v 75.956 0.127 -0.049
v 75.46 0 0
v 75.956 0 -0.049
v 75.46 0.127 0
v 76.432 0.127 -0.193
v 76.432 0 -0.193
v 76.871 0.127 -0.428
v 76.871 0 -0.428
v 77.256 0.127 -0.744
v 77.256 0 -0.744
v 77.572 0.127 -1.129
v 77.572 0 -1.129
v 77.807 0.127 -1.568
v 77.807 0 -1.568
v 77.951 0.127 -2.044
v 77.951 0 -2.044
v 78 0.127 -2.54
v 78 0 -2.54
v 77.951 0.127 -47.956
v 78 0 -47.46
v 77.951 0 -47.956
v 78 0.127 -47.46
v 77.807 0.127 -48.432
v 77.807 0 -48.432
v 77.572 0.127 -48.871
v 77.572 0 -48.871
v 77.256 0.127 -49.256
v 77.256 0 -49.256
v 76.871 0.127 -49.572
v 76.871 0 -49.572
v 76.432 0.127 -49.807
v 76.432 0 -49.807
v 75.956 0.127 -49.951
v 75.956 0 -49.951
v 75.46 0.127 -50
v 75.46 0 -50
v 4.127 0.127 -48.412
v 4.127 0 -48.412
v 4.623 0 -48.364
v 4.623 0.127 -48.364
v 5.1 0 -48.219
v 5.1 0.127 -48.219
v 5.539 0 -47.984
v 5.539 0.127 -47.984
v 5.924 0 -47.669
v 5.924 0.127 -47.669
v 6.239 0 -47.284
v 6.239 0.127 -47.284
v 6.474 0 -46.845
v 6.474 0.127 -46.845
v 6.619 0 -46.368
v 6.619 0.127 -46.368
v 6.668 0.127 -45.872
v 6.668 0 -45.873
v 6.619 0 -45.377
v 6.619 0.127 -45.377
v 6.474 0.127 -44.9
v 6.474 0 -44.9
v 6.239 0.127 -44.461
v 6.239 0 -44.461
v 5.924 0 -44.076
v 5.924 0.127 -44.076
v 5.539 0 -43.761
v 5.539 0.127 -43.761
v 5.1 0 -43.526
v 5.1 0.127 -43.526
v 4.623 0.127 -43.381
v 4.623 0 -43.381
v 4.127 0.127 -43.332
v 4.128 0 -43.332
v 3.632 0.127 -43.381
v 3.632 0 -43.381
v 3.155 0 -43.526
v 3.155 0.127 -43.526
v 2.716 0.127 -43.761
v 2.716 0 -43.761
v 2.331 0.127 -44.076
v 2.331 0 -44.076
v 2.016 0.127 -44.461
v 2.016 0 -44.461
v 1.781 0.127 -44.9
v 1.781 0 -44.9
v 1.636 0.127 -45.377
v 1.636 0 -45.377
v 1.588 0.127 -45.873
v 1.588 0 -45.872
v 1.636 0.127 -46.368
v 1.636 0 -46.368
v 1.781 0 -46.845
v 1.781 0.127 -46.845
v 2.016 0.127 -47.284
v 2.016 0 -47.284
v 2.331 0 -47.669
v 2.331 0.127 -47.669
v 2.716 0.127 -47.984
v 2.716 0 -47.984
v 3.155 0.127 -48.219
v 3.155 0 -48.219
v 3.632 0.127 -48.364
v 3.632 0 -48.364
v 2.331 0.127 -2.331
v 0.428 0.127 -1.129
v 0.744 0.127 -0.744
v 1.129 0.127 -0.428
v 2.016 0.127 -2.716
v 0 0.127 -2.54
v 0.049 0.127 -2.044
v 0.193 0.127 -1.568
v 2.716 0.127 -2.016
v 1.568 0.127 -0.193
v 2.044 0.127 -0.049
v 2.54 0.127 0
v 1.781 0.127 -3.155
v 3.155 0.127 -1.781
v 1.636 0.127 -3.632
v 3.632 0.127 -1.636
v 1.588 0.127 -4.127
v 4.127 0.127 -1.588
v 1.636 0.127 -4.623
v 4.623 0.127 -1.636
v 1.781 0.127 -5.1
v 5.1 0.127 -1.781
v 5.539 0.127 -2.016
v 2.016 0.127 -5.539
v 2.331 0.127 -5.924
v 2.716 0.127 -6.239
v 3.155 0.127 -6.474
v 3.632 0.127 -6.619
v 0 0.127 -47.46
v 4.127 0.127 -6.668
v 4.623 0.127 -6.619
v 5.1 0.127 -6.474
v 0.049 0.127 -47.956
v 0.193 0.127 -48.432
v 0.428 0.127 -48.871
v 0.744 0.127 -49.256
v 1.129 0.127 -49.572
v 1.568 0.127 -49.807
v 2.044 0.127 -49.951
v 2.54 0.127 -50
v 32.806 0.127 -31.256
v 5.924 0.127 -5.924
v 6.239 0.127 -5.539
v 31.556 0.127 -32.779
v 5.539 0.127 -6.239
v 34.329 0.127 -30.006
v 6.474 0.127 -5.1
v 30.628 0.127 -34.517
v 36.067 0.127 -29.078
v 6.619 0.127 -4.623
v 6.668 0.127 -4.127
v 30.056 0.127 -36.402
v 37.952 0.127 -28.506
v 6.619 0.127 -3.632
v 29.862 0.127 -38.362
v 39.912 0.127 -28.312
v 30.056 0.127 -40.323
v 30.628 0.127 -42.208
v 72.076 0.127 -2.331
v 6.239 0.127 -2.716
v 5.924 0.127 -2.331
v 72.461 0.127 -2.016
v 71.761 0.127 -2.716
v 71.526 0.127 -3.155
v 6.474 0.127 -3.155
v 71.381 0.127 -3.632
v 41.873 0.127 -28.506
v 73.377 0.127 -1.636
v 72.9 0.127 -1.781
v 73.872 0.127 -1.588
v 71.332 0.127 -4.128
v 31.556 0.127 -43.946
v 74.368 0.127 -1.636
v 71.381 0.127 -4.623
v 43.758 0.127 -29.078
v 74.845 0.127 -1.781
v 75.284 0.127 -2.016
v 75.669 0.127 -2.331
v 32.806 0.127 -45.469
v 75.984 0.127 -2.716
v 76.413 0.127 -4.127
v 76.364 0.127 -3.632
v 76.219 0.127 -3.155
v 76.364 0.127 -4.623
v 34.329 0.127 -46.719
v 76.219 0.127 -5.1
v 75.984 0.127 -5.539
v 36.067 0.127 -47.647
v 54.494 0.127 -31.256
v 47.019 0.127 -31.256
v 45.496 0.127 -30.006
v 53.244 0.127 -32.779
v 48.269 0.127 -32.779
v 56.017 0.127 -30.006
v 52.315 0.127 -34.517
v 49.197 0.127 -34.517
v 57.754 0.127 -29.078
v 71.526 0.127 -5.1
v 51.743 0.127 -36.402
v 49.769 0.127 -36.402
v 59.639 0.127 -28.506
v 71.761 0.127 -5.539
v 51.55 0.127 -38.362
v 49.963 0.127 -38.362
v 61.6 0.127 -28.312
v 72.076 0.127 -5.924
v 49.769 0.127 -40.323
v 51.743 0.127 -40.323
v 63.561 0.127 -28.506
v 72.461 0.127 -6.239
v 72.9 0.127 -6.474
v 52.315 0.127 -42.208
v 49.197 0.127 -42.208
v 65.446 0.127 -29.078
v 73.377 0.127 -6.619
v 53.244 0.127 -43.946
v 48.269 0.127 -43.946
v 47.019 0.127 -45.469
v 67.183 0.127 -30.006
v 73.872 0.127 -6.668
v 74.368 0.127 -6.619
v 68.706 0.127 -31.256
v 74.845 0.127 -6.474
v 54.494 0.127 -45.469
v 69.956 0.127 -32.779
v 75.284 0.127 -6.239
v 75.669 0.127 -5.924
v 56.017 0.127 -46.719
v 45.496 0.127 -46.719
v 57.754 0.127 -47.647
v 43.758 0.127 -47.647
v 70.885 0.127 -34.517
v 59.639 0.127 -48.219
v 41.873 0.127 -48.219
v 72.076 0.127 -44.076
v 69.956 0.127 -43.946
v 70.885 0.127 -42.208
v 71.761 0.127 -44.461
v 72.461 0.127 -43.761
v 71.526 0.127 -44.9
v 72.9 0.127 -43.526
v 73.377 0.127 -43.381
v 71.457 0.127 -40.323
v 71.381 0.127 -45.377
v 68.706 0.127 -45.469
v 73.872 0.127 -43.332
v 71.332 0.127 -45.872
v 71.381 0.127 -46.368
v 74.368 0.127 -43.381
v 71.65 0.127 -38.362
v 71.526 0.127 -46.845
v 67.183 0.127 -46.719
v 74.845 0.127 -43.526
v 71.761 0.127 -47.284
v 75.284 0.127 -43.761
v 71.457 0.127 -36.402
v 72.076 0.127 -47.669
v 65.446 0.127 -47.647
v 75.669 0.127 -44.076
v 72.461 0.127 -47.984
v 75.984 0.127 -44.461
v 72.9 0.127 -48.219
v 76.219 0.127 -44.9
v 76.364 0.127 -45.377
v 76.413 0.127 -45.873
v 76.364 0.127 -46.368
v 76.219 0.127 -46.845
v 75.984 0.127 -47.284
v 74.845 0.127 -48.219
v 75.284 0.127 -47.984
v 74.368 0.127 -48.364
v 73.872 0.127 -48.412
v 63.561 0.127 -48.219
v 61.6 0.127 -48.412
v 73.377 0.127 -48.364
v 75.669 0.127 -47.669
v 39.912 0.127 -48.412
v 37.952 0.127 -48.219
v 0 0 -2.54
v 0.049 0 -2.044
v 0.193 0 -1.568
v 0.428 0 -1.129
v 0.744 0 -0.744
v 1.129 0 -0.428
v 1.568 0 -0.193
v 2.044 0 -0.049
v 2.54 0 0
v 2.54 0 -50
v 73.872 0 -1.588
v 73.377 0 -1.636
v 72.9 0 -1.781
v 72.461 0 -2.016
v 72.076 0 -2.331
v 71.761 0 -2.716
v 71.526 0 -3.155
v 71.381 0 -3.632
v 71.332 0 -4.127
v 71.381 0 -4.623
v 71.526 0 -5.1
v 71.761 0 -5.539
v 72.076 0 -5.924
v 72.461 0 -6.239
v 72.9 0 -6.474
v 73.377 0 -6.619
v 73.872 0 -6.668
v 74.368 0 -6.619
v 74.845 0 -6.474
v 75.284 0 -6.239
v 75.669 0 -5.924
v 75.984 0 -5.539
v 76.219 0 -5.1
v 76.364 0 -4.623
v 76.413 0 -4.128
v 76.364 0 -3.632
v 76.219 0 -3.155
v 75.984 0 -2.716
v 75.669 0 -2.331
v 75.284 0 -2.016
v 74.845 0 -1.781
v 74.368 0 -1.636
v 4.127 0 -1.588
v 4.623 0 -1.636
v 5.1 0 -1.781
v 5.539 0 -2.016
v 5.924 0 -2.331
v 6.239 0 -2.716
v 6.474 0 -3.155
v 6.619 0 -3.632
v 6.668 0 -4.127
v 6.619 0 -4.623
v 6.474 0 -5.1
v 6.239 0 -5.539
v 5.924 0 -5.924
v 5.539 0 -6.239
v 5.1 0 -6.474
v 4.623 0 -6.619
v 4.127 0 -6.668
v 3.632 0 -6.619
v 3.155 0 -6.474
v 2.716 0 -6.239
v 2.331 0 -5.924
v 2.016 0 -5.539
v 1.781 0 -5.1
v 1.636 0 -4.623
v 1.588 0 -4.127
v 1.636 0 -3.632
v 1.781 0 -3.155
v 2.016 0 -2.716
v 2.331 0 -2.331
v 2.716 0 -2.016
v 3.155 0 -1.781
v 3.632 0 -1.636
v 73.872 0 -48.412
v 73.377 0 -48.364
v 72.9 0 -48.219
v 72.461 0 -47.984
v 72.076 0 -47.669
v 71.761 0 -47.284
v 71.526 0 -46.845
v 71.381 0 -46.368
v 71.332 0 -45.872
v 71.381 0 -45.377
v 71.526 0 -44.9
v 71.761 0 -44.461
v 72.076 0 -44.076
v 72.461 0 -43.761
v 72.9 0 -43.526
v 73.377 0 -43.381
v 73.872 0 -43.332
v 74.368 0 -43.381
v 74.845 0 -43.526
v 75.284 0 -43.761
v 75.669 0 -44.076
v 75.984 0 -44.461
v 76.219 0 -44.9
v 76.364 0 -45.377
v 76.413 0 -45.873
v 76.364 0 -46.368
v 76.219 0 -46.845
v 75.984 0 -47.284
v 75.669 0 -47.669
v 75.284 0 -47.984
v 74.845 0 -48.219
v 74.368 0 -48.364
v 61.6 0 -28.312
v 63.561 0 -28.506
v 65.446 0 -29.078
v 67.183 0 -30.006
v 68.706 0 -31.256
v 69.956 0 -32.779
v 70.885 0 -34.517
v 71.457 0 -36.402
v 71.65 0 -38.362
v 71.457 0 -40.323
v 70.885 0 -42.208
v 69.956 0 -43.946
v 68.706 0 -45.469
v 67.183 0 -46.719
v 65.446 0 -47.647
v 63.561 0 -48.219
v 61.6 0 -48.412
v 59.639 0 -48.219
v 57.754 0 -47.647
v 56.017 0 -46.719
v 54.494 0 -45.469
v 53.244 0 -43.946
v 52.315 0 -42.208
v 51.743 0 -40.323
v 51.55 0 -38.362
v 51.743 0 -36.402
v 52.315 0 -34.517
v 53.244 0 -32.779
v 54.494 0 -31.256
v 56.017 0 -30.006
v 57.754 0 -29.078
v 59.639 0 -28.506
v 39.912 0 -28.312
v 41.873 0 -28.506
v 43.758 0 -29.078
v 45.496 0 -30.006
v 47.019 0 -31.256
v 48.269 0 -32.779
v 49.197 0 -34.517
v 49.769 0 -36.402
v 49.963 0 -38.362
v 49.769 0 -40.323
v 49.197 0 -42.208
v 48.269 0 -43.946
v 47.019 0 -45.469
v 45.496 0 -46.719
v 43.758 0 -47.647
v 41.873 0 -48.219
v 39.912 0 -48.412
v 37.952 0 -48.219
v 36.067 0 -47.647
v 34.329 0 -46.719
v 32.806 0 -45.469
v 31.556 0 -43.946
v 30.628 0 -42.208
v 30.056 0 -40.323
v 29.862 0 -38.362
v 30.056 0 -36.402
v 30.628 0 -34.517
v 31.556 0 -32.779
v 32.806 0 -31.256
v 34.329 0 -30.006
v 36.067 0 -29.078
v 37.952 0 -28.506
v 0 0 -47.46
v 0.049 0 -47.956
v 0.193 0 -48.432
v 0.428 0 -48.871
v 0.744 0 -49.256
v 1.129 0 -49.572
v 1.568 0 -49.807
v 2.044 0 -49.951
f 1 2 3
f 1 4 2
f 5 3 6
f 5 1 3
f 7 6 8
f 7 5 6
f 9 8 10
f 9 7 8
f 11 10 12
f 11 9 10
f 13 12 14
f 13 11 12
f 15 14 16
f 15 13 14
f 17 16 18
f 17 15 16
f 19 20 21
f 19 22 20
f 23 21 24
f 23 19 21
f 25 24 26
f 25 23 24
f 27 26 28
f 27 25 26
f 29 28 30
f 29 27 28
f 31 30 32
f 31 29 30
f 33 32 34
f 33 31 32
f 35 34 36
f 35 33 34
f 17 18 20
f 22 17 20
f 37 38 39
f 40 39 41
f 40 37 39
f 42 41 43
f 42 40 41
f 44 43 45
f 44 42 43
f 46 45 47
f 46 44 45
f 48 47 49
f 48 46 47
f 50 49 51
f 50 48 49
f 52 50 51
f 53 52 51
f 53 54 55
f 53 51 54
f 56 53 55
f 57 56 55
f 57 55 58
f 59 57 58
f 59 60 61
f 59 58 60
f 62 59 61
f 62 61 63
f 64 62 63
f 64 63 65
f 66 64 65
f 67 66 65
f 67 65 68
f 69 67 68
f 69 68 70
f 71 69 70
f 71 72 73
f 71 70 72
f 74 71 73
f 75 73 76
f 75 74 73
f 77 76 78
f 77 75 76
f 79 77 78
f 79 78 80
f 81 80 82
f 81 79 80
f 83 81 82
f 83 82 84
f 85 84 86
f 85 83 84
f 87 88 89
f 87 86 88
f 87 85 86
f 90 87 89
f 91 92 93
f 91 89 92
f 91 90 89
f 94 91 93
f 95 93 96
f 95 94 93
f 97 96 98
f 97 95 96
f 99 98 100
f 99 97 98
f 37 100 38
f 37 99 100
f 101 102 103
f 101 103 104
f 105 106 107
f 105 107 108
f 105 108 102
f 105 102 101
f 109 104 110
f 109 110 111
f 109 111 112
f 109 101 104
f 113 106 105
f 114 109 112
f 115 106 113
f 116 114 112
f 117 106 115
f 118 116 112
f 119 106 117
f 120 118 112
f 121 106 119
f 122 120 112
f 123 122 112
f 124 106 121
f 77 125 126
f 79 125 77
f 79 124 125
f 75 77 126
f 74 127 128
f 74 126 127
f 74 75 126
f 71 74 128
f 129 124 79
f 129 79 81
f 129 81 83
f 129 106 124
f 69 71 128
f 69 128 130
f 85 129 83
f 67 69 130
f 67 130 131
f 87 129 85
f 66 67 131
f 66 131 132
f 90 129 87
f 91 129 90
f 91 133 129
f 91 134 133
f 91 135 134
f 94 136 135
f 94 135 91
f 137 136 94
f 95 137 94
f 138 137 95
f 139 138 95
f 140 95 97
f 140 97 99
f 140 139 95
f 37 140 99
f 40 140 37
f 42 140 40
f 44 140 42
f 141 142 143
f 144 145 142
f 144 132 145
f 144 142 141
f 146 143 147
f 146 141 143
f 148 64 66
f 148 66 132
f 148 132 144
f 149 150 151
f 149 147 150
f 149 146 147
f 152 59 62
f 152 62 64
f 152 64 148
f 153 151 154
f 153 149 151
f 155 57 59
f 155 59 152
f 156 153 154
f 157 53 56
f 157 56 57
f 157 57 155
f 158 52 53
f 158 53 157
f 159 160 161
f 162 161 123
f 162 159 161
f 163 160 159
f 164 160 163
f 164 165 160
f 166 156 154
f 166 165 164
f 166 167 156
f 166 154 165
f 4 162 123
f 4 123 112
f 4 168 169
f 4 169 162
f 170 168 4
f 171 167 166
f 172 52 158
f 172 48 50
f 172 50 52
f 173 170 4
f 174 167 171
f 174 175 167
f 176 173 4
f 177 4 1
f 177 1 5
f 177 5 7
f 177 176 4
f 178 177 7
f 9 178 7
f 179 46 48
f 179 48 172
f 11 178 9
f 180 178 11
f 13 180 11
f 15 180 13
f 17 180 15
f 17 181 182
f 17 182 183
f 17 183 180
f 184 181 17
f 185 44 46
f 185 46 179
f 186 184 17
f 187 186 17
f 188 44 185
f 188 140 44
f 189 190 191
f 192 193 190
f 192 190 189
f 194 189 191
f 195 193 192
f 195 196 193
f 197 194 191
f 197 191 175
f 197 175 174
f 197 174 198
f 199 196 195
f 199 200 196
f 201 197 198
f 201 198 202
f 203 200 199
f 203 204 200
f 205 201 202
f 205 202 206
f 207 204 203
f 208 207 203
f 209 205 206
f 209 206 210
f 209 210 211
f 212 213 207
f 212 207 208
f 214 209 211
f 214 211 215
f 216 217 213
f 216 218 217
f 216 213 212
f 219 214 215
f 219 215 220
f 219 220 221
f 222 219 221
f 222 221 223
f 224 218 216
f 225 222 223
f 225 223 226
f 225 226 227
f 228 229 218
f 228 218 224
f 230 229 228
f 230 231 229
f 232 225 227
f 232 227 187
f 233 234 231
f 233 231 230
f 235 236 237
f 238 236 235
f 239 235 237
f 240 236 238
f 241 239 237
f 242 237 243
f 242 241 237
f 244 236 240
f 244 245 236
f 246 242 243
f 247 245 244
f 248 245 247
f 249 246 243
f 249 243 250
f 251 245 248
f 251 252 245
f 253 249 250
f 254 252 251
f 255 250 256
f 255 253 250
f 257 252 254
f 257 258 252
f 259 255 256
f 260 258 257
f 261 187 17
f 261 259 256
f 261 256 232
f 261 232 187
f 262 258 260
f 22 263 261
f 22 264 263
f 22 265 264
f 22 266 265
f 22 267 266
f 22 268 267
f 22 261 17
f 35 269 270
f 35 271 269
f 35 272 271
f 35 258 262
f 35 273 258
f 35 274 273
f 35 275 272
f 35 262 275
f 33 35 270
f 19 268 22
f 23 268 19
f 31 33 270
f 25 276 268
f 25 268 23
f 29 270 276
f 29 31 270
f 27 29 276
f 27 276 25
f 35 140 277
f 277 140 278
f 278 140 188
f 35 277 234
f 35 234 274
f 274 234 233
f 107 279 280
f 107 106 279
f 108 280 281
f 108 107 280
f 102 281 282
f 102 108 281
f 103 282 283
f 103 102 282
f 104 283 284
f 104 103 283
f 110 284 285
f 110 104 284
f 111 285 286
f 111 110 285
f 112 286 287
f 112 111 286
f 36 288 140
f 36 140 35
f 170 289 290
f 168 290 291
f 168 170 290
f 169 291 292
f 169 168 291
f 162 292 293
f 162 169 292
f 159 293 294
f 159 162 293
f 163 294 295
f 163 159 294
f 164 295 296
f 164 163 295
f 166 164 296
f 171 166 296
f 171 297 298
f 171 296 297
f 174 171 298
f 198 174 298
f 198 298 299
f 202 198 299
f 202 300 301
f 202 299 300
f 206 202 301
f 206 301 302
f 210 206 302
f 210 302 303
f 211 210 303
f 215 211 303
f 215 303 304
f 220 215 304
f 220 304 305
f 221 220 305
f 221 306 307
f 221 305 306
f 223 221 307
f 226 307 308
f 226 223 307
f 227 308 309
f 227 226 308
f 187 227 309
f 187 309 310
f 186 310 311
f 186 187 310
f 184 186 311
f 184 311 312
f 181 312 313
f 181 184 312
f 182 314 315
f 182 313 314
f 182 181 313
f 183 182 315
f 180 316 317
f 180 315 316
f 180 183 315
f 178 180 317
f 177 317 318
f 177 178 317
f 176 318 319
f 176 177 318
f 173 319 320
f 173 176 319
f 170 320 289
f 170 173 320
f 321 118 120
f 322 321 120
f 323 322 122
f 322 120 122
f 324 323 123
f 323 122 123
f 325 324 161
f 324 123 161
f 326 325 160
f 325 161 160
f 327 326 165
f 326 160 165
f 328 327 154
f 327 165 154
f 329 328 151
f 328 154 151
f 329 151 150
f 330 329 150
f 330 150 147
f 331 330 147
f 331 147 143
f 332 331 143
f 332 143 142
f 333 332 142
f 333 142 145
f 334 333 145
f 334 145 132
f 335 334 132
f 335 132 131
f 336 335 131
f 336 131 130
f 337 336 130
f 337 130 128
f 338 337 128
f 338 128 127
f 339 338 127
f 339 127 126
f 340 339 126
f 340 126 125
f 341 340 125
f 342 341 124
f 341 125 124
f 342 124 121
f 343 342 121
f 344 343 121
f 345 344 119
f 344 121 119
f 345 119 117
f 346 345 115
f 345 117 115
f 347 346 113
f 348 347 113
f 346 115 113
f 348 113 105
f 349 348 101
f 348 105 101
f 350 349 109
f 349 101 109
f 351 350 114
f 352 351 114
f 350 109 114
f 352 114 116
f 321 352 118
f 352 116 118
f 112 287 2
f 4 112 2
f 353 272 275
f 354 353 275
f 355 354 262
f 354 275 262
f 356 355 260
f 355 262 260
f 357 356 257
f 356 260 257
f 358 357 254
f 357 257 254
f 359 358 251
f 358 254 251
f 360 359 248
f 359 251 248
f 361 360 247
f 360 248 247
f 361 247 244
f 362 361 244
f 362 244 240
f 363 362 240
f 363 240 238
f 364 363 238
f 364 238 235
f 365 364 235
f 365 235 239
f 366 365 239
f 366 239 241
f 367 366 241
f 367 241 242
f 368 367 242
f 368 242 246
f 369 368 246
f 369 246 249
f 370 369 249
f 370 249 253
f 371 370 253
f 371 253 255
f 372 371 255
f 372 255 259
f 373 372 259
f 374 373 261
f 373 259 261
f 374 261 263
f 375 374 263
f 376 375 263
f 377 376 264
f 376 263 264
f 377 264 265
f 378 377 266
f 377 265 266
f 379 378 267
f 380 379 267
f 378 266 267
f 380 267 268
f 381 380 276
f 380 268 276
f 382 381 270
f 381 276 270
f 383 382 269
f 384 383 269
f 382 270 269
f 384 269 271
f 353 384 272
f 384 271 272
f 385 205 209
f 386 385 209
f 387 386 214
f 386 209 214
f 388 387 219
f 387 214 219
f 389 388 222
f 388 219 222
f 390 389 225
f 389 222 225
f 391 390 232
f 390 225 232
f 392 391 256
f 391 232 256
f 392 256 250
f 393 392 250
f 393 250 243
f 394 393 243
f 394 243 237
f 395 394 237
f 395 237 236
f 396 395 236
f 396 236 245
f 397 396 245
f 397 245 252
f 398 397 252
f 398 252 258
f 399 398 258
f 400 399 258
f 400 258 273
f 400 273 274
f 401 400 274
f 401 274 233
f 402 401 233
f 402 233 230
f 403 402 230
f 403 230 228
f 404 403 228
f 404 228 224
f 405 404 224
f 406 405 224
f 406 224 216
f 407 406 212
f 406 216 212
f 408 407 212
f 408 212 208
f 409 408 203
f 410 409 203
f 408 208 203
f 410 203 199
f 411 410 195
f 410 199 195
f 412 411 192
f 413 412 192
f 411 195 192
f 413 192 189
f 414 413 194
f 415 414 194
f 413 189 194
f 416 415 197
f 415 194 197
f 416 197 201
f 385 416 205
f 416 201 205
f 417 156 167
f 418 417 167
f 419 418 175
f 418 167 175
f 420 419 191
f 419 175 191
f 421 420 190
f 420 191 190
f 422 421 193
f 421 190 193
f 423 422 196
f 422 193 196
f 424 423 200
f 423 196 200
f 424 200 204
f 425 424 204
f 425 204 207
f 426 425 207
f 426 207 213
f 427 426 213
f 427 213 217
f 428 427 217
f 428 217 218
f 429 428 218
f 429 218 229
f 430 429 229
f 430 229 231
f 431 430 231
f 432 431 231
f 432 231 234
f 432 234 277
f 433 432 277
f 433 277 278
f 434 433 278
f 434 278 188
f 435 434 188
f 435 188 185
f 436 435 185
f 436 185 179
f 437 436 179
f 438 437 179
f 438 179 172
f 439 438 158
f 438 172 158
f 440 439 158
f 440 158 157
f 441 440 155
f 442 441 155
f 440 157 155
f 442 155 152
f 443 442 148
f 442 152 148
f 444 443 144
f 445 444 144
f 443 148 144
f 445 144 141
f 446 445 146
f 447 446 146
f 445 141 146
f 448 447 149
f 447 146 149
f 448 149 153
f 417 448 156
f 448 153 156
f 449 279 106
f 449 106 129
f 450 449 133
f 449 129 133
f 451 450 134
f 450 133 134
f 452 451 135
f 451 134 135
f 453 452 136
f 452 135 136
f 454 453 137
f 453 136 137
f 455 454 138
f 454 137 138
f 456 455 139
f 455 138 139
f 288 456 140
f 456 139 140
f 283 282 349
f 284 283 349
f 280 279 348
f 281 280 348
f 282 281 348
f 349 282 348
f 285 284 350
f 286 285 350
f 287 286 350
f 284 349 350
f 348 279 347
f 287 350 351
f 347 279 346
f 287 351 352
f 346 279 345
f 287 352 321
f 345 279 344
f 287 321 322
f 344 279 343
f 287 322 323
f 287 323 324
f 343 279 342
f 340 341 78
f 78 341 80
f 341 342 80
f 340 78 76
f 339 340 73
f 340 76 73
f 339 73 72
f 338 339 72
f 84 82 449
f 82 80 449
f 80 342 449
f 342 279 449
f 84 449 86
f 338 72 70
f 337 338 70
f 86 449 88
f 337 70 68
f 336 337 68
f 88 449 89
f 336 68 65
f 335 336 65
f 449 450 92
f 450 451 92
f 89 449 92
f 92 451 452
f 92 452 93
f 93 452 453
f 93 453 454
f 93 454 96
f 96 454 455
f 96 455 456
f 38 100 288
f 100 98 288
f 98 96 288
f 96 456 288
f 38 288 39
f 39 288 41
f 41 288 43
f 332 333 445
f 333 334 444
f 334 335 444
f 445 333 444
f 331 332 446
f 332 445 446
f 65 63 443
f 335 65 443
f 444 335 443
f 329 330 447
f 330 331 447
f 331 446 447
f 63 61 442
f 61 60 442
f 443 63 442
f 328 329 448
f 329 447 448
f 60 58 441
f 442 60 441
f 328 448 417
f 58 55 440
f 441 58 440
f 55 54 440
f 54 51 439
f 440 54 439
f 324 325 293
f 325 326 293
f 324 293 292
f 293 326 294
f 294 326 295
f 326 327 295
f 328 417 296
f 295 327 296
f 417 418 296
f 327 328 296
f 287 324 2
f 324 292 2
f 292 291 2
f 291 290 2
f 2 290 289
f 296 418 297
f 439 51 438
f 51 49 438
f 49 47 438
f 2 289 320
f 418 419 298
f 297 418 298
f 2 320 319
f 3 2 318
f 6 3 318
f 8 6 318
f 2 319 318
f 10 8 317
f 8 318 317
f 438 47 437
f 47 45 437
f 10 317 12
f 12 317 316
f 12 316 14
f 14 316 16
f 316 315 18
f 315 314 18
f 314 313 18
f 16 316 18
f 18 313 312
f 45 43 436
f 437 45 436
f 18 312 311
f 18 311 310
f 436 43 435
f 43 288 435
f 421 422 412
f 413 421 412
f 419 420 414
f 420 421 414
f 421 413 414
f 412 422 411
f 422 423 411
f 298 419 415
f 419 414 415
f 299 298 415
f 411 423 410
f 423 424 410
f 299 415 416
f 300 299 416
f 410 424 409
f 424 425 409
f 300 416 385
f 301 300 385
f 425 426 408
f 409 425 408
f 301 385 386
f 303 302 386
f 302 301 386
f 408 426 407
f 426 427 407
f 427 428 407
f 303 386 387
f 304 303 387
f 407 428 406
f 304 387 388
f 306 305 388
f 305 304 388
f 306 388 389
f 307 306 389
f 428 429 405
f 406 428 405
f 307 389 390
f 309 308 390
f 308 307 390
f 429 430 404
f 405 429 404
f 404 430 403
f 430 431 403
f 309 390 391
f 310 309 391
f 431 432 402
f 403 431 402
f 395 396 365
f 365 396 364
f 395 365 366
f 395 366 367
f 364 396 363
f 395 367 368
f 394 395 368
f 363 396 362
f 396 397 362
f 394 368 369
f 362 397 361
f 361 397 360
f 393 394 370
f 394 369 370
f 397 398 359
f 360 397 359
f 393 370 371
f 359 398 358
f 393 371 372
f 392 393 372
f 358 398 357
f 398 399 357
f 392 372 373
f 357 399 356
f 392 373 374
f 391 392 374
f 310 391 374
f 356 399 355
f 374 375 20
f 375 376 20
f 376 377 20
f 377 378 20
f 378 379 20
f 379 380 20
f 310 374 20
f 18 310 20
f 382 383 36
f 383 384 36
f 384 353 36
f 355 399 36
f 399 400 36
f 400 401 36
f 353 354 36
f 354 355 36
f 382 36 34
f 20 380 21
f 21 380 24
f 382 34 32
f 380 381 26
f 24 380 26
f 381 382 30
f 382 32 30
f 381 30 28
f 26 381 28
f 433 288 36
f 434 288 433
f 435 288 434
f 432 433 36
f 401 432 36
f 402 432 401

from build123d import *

# Parameters (mm, degrees)
SKETCH1_W               = 78
SKETCH1_H               = 50
KAPTON_INSULATION_DEPTH = 0.127
EDGE_RADIUS_R           = 2.54
SKETCH3_R               = 2.54
MAGNET_HOLE_DEPTH       = 93.649965618
MIRROR2_COPY_1_SKETCH_R = 2.54
MIRROR2_COPY_1_DEPTH    = 93.649965618
SKETCH4_R               = 10.05
CUT_EXTRUDE2_DEPTH      = 93.649965618


with BuildPart() as part:
    # Sketch1 → kapton_insulation (new body)
    with BuildSketch(Plane(origin=(0, 0, 0), x_dir=(1, 0, 0), z_dir=(0, 1, 0))):
        with Locations((39, 25)):
            Rectangle(SKETCH1_W, SKETCH1_H)
    extrude(amount=KAPTON_INSULATION_DEPTH)

    # edge_radius
    edge_radius_edges = [part.edges().sort_by_distance(p)[0] for p in [
        (0, 0.0635, -50),
        (78, 0.0635, -50),
        (78, 0.0635, 0),
        (0, 0.0635, 0),
    ]]
    fillet(edge_radius_edges, radius=EDGE_RADIUS_R)

    # Sketch3 → magnet_hole (cut, through all)
    with BuildSketch(Plane(origin=(0, 0.127, 0), x_dir=(1, 0, 0), z_dir=(0, 1, 0))):
        with Locations(Location((4.1275, 4.1275, 0), (0, 0, 270))):
            Circle(SKETCH3_R)
    magnet_hole = extrude(amount=-MAGNET_HOLE_DEPTH, mode=Mode.SUBTRACT)

    # Mirror1: magnet_hole across plane
    add(magnet_hole.mirror(Plane.XY.offset(-25)), mode=Mode.SUBTRACT)

    # Mirror2: magnet_hole across plane
    add(magnet_hole.mirror(Plane(origin=(39, 0, 0), x_dir=(0, 0, 1), z_dir=(1, 0, 0))), mode=Mode.SUBTRACT)

    # Mirror2 copy 1 sketch → Mirror2 copy 1 (cut, through all)
    with BuildSketch(Plane(origin=(78, 0.127, -50), x_dir=(-1, 0, 0), z_dir=(0, 1, 0))):
        with Locations(Location((4.1275, 4.1275, 0), (0, 0, 270))):
            Circle(MIRROR2_COPY_1_SKETCH_R)
    extrude(amount=-MIRROR2_COPY_1_DEPTH, mode=Mode.SUBTRACT)

    # Sketch4 → Cut-Extrude2 (cut, through all)
    with BuildSketch(Plane(origin=(0, 0.127, 0), x_dir=(1, 0, 0), z_dir=(0, 1, 0))):
        with Locations(Location((61.6, 38.3625, 0), (0, 0, 270))):
            Circle(SKETCH4_R)
        with Locations(Location((39.9125, 38.3625, 0), (0, 0, 270))):
            Circle(SKETCH4_R)
    extrude(amount=-CUT_EXTRUDE2_DEPTH, mode=Mode.SUBTRACT)


solid = part.part
